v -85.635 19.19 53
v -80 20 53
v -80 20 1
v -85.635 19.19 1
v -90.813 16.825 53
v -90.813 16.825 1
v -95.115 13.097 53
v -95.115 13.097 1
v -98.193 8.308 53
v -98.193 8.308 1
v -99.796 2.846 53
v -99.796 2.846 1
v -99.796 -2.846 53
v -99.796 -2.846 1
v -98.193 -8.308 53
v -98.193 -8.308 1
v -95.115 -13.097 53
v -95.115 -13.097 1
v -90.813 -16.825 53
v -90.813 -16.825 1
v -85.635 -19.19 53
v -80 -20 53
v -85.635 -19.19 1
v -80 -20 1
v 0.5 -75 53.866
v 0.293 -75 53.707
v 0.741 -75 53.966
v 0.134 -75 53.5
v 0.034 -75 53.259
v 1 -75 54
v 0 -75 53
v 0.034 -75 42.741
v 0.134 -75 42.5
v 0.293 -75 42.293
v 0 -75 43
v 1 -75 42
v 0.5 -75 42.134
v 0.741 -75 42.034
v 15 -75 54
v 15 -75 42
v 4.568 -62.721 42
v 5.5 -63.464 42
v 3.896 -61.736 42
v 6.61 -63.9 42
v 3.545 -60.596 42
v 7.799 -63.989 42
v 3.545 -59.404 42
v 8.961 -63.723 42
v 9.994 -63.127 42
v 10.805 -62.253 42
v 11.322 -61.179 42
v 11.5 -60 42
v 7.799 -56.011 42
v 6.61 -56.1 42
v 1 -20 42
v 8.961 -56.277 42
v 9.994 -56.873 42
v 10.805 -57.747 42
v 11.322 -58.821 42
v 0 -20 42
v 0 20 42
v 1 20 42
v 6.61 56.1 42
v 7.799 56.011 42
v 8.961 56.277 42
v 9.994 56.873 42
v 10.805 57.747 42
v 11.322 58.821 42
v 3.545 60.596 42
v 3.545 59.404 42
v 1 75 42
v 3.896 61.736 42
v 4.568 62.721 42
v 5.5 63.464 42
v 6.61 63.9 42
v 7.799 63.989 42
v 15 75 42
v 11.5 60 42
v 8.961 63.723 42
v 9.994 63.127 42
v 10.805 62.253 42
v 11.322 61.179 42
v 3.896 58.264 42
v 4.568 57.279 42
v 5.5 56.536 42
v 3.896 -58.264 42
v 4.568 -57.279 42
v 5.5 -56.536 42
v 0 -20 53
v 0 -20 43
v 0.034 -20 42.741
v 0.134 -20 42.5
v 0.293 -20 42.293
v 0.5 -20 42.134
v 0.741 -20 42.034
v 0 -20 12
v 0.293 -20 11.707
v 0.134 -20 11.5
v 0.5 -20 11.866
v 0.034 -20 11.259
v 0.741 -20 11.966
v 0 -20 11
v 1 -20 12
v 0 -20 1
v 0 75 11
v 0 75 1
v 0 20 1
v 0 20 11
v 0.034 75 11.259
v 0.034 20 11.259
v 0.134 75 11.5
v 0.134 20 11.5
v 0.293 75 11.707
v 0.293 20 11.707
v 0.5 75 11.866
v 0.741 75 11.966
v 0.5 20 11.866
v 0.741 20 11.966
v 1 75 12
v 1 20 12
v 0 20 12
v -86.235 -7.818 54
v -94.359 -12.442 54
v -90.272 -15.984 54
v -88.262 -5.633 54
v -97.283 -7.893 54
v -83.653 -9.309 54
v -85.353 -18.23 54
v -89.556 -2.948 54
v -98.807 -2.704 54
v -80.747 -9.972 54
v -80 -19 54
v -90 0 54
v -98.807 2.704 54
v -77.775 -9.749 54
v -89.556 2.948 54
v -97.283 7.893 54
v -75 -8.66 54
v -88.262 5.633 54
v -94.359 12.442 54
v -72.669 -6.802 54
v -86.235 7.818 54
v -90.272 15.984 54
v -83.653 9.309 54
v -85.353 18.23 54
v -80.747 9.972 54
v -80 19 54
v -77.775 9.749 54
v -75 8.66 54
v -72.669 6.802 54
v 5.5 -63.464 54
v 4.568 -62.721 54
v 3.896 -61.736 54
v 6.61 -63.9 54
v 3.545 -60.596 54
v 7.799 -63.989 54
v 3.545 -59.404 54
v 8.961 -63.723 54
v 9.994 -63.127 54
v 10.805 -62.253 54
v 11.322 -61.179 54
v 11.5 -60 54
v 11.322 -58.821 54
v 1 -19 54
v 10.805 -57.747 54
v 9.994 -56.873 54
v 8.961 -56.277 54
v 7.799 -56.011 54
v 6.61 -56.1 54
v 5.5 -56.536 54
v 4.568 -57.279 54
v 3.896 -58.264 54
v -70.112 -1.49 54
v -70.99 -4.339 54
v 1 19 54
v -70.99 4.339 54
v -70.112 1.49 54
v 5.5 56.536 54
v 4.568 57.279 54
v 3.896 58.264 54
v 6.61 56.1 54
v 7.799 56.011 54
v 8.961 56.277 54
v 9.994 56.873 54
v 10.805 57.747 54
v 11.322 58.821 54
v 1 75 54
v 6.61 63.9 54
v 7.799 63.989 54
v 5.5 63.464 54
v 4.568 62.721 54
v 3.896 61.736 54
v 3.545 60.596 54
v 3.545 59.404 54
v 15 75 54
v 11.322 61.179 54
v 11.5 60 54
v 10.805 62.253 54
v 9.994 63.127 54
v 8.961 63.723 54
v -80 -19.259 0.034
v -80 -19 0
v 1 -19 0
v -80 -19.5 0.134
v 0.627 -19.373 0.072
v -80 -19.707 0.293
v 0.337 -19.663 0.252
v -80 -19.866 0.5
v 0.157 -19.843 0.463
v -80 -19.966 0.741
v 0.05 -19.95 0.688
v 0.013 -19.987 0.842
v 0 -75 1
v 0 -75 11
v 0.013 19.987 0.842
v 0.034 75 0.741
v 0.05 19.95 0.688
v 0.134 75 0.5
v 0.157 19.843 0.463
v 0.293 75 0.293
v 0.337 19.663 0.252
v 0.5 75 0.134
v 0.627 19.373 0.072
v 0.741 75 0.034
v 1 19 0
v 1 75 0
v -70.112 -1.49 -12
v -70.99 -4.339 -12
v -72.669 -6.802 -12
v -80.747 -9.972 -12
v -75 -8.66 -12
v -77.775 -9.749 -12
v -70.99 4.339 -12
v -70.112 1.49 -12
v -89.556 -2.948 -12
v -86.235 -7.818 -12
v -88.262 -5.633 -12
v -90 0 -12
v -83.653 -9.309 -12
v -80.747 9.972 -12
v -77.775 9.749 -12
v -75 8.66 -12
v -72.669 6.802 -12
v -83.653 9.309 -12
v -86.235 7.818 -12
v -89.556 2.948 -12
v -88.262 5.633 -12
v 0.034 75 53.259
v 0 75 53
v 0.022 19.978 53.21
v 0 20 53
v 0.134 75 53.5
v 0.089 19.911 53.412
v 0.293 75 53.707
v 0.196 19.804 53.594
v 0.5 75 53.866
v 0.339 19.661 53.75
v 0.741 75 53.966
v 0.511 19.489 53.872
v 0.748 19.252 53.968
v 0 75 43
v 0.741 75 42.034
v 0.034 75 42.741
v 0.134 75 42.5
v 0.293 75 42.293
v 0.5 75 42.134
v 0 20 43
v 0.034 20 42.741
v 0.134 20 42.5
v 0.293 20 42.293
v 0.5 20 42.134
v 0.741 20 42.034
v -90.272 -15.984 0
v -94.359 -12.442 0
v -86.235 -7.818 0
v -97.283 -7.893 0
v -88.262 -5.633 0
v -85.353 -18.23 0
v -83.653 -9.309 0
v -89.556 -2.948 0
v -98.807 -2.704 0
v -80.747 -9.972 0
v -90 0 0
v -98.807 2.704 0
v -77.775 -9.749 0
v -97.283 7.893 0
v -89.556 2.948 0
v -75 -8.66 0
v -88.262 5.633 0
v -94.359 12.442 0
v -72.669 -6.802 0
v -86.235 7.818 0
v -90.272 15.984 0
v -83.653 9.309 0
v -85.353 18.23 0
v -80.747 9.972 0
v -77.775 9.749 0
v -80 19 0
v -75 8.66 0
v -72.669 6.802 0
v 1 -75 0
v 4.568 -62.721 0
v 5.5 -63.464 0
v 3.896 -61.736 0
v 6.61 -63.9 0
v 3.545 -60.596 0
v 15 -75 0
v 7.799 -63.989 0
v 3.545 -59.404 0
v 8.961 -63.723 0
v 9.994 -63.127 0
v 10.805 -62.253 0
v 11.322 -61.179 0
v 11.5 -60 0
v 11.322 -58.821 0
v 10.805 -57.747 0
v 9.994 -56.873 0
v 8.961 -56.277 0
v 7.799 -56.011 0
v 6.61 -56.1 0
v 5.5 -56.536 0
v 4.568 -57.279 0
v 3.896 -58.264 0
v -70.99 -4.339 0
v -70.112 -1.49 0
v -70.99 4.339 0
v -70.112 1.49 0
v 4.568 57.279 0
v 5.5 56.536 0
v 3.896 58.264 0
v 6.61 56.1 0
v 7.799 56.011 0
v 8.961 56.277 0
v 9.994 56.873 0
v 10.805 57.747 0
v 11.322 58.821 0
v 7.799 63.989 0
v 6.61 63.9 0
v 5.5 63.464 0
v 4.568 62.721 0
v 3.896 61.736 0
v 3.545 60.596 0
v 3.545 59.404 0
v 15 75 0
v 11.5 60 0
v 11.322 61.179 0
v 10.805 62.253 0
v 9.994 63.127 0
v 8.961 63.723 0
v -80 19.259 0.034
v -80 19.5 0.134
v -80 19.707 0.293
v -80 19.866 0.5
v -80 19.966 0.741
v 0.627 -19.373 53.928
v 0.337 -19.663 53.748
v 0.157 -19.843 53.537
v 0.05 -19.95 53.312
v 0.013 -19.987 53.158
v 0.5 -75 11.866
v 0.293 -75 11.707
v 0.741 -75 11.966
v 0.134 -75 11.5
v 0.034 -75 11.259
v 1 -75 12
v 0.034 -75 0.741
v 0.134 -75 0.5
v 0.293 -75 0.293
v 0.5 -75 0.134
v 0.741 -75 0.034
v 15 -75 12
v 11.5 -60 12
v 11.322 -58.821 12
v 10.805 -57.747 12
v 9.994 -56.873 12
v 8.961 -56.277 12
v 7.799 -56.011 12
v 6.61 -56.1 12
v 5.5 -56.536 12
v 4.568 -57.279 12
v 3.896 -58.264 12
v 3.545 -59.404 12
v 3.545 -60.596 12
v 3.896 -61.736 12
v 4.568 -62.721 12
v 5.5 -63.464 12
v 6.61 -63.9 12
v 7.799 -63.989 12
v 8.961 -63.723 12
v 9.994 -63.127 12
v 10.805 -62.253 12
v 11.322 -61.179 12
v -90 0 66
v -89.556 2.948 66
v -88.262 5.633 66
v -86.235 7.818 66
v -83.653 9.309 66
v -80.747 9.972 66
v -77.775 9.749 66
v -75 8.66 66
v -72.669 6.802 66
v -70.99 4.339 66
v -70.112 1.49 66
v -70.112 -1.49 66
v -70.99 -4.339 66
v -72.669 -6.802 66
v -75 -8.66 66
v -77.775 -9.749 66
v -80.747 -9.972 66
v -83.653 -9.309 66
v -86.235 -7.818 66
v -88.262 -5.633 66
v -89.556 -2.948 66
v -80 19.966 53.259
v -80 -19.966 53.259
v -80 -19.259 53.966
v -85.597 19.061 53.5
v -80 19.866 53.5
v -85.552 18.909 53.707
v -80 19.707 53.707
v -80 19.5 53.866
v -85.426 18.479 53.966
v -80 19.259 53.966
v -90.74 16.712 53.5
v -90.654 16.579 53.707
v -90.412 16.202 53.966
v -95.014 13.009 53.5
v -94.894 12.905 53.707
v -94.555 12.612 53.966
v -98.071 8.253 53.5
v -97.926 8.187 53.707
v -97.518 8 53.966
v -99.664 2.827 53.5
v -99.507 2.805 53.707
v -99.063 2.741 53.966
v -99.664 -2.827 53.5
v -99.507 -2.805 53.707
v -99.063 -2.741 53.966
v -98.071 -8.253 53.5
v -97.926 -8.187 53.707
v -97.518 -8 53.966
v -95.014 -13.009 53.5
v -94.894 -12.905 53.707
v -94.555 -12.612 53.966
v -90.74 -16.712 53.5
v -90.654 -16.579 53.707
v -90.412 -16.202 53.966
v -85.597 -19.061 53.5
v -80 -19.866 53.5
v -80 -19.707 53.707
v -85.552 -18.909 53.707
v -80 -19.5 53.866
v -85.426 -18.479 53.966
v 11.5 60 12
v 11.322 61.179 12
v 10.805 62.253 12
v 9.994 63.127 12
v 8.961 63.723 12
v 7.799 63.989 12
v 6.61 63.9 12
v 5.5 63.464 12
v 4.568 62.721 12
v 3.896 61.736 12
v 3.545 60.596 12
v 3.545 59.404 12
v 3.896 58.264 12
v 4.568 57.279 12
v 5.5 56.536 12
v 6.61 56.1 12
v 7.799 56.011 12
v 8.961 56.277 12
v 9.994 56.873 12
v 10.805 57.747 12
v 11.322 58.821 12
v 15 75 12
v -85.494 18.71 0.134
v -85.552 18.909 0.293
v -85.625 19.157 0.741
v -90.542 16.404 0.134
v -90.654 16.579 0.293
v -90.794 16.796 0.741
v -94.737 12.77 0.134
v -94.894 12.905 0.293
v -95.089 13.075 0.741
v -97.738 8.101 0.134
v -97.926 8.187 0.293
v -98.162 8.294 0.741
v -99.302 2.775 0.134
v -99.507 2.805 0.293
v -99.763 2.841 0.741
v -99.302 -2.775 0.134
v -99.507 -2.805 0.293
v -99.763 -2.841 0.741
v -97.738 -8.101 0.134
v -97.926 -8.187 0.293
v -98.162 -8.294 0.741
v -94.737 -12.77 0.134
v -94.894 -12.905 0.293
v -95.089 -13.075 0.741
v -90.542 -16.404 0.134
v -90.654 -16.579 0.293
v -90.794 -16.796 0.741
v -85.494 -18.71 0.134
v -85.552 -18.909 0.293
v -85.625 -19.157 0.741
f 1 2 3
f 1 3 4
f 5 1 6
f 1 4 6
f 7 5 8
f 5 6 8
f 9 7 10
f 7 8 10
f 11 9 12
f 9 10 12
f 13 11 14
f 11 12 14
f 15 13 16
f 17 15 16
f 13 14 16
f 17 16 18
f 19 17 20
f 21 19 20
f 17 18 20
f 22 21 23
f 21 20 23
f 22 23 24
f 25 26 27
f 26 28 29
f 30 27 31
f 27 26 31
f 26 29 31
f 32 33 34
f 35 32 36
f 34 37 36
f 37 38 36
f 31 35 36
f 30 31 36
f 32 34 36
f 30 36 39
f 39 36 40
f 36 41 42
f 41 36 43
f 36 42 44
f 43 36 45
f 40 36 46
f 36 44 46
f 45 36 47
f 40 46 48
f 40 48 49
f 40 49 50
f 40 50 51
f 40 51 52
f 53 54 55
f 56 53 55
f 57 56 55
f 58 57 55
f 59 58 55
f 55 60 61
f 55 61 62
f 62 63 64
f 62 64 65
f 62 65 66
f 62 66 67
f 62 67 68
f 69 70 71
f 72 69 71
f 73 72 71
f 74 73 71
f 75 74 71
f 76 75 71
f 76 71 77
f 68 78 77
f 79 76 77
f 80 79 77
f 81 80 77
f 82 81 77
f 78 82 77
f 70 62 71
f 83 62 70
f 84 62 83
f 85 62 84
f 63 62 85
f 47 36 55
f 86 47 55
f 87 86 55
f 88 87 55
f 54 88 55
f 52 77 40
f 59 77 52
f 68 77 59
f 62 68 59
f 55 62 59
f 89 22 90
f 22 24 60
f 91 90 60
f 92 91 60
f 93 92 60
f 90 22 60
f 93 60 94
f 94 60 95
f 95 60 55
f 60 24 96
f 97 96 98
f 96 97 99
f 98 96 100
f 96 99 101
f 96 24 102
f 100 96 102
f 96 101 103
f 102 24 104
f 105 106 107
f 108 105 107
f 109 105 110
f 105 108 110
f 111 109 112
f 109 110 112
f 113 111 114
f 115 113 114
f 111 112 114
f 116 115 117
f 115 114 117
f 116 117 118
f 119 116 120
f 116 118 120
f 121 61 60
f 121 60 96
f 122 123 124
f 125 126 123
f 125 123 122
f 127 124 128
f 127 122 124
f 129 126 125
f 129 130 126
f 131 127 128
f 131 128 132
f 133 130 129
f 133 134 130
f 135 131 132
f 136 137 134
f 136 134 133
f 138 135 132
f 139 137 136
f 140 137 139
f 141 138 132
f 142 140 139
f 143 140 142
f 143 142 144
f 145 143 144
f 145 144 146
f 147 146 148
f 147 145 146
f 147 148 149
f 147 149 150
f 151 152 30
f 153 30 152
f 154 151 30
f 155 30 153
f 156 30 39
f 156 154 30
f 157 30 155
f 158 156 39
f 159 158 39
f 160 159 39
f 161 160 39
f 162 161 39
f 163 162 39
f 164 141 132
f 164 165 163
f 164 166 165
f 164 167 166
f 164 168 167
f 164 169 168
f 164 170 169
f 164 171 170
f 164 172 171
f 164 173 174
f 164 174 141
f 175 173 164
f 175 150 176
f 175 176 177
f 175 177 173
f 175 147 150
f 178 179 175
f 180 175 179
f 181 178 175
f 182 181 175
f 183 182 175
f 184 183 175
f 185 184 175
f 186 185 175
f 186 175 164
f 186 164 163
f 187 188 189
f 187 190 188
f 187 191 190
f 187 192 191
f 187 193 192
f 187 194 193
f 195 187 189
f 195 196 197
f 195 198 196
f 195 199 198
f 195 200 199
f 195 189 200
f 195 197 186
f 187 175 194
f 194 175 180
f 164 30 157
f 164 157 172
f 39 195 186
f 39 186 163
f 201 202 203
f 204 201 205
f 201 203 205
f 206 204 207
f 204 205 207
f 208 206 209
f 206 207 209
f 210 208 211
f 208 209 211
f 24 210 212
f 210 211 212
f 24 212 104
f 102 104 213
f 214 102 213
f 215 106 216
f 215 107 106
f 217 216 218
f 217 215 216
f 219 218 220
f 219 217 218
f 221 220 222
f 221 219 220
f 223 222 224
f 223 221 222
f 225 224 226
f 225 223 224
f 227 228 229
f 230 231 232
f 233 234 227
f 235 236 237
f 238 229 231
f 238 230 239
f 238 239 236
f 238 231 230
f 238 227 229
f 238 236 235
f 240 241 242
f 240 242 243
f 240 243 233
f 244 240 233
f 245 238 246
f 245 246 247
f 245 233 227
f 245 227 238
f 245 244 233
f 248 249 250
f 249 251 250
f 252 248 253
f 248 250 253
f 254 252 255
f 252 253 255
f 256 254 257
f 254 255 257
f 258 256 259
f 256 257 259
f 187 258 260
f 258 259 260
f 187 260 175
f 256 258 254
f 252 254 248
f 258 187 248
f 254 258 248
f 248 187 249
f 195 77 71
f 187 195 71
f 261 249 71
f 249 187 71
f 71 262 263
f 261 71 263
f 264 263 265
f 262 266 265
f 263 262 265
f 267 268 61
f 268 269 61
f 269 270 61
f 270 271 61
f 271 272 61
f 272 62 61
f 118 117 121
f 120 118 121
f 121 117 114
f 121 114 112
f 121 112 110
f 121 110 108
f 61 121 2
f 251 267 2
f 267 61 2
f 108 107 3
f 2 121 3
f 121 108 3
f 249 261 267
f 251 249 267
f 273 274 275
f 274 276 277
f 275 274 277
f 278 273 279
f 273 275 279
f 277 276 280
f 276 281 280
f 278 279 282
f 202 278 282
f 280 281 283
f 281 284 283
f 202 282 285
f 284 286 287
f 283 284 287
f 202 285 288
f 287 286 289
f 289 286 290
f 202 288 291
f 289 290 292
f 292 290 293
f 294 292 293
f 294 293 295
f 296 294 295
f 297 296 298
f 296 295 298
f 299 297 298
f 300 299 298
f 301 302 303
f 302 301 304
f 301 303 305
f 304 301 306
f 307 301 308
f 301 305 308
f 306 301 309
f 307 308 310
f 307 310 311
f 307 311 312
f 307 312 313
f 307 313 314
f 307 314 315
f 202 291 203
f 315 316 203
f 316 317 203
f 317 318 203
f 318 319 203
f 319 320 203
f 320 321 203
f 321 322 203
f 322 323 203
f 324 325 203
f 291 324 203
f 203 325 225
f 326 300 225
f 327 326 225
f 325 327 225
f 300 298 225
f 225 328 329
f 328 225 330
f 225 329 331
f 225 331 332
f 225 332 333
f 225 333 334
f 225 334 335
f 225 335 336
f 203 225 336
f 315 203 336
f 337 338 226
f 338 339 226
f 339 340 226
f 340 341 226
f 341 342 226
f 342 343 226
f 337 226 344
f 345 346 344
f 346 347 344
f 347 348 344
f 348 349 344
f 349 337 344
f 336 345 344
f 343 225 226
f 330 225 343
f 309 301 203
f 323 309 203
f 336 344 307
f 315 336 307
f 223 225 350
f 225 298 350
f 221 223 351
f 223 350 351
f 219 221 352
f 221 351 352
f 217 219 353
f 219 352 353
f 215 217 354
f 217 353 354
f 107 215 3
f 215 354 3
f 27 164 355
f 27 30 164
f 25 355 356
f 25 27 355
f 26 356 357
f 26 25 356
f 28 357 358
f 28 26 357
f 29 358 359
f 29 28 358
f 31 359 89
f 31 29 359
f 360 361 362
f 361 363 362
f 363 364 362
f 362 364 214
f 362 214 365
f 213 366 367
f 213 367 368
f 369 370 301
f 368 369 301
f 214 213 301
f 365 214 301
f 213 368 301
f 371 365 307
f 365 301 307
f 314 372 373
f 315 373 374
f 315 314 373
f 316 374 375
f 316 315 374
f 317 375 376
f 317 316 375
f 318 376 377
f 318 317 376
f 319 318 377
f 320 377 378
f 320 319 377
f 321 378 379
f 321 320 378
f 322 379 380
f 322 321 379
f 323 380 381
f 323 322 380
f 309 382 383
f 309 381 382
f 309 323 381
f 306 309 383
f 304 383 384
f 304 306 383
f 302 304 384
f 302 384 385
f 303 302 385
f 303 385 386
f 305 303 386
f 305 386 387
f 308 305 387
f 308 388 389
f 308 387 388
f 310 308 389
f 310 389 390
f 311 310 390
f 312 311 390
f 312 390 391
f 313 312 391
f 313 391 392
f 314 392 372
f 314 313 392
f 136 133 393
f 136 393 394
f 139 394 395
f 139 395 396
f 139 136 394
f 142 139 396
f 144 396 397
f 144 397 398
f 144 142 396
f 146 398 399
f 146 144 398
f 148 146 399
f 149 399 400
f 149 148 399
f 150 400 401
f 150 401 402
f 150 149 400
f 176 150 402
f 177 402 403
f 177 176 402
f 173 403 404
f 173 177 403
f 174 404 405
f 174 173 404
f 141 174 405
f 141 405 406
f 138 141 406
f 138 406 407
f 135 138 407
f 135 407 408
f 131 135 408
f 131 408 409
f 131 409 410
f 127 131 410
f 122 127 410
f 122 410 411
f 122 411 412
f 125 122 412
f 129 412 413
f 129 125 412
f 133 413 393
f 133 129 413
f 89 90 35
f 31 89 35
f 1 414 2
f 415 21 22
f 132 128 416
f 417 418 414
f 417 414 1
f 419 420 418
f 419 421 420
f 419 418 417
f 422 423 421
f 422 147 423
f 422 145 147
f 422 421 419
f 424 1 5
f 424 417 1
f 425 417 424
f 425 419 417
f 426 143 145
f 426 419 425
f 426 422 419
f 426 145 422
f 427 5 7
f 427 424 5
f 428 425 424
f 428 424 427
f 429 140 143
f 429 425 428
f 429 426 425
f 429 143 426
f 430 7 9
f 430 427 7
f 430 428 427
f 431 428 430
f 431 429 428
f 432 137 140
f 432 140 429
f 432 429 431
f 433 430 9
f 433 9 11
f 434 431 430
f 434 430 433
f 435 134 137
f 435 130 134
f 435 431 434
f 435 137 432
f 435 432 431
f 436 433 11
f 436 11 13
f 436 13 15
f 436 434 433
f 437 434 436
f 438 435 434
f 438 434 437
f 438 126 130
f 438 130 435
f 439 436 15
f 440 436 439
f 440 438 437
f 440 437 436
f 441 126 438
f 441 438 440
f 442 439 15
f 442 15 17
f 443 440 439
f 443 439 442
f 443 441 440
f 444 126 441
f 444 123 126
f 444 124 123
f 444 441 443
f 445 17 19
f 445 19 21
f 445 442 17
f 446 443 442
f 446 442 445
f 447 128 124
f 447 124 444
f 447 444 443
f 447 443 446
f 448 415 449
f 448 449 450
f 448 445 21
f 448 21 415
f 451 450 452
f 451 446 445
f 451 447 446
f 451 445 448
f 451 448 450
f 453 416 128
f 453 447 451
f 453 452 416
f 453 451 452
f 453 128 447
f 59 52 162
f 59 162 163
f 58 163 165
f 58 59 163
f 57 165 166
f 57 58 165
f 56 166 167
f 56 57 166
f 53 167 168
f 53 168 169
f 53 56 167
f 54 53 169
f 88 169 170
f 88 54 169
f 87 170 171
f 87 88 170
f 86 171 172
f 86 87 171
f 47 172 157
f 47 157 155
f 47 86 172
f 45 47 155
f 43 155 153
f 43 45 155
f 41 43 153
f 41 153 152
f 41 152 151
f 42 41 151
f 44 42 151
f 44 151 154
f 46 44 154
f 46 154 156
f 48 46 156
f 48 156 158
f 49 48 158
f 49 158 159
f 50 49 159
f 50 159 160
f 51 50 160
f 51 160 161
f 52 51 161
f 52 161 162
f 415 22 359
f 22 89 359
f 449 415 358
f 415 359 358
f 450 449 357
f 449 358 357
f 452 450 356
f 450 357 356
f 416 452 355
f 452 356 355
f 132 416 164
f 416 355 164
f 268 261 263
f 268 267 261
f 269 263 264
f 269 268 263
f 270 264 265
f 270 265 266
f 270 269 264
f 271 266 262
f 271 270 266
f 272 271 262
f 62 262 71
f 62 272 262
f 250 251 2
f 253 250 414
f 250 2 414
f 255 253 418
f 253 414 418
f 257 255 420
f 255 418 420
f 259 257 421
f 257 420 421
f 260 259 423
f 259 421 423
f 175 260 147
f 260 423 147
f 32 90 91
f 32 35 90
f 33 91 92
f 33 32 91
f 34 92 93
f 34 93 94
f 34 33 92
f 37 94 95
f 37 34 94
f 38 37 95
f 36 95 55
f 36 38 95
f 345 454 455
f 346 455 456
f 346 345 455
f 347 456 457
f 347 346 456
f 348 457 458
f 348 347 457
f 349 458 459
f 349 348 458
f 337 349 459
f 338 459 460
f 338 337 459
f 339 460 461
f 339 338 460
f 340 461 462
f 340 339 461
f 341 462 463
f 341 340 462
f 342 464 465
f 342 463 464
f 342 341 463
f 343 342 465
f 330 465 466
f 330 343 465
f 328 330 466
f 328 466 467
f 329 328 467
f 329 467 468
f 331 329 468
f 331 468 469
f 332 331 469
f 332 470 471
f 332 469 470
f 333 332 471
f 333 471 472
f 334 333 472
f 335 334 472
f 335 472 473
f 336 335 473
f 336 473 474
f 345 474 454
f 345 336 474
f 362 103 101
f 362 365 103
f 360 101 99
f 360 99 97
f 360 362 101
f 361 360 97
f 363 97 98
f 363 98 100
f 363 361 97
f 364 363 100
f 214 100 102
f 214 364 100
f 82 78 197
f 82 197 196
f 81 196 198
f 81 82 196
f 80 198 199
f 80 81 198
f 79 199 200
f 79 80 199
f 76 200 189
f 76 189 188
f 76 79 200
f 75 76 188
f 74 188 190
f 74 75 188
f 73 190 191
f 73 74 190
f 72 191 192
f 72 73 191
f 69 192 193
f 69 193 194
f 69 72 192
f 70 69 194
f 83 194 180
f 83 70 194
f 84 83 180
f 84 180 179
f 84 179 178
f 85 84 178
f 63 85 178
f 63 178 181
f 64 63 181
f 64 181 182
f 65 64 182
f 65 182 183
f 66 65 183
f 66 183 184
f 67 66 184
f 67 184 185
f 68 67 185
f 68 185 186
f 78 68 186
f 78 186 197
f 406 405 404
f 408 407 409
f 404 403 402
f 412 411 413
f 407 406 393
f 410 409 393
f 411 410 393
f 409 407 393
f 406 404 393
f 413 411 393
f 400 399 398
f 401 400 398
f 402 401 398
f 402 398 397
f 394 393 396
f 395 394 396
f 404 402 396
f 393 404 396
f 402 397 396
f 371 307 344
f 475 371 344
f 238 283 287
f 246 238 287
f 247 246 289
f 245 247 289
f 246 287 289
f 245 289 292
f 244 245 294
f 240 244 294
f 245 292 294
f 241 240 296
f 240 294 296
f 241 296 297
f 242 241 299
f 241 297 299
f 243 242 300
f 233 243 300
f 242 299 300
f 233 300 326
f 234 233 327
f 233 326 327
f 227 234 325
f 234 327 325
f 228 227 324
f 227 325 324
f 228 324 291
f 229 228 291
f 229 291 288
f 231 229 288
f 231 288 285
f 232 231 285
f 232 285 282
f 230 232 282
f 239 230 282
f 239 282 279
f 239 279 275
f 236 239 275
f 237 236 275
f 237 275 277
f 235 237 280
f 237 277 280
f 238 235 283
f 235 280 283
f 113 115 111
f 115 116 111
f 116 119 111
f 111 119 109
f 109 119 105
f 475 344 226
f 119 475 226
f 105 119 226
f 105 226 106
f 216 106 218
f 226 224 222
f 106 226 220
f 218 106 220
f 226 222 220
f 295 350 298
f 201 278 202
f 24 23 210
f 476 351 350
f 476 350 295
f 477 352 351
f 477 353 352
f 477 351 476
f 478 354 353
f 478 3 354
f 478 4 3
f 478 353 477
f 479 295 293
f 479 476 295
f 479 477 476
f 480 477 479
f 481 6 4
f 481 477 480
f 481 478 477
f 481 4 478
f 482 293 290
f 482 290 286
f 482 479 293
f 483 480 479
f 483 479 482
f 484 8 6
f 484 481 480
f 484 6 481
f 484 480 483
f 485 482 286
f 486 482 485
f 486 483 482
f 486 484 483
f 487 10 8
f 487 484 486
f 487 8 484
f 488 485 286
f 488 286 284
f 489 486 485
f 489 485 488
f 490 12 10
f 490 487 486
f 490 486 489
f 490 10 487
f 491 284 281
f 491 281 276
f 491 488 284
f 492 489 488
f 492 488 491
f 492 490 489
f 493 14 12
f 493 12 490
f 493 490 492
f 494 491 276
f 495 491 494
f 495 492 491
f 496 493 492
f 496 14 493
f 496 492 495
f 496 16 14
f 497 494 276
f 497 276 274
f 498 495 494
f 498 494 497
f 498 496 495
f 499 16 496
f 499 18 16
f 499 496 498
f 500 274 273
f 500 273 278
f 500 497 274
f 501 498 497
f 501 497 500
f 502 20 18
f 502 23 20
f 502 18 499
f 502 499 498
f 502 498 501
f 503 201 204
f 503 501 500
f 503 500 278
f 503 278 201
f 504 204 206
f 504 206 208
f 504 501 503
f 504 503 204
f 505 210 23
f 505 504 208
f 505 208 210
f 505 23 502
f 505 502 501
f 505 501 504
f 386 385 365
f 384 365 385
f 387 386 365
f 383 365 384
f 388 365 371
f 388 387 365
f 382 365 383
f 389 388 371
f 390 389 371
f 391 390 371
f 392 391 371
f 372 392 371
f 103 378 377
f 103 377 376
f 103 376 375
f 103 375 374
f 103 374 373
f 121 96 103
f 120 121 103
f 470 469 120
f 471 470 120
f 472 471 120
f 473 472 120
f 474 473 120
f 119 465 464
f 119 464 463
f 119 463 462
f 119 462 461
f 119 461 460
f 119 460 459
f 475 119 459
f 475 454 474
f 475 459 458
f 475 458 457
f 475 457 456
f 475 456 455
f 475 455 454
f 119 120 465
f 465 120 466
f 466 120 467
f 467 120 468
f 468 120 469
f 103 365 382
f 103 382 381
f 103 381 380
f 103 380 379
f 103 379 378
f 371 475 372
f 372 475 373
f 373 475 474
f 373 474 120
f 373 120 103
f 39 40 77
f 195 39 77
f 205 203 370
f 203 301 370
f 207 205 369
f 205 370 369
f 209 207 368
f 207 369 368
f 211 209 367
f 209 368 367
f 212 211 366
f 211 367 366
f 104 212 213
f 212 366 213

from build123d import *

# Parameters (mm, degrees)
SKETCH1_R           = 4
BOSS_EXTRUDE1_DEPTH = 54
SKETCH2_R           = 10
BOSS_EXTRUDE2_DEPTH = 12
SKETCH3_W           = 15
SKETCH3_H           = 30
CUT_EXTRUDE1_DEPTH  = 150
FILLET1_R           = 1


with BuildPart() as part:
    # Sketch1 → Boss-Extrude1 (new body)
    with BuildSketch(Plane.XY):
        with BuildLine():
            Line((0, 75), (0, 20))
            Line((0, 20), (-80, 20))
            ThreePointArc((-80, 20), (-100, 0), (-80, -20))
            Line((-80, -20), (0, -20))
            Line((0, -20), (0, -75))
            Line((0, -75), (15, -75))
            Line((15, -75), (15, 75))
            Line((15, 75), (0, 75))
        make_face()
        with Locations((7.5, 60)):
            Circle(SKETCH1_R, mode=Mode.SUBTRACT)
        with Locations((7.5, -60)):
            Circle(SKETCH1_R, mode=Mode.SUBTRACT)
    extrude(amount=BOSS_EXTRUDE1_DEPTH)

    # Sketch2 → Boss-Extrude2 (add)
    with BuildSketch(Plane(origin=(0, 0, 0), x_dir=(-1, 0, 0), z_dir=(0, 0, -1))):
        with Locations((80, 0)):
            Circle(SKETCH2_R)
    boss_extrude2 = extrude(amount=BOSS_EXTRUDE2_DEPTH)

    # Mirror1: Boss-Extrude2 across plane
    add(boss_extrude2.mirror(Plane.XY.offset(27)))

    # Sketch3 → Cut-Extrude1 (cut)
    with BuildSketch(Plane(origin=(0, 75, 0), x_dir=(1, 0, 0), z_dir=(0, 1, 0))):
        with Locations((7.5, -27)):
            Rectangle(SKETCH3_W, SKETCH3_H)
    extrude(amount=-CUT_EXTRUDE1_DEPTH, mode=Mode.SUBTRACT)

    # Fillet1
    fillet1_edges = [part.edges().sort_by_distance(p)[0] for p in [
        (0, -47.5, 0),
        (-40, -20, 0),
        (-100, 0, 0),
        (0, -47.5, 54),
        (0, 47.5, 54),
        (-40, 20, 54),
        (-100, 0, 54),
        (0, -47.5, 42),
        (0, 47.5, 42),
        (0, -47.5, 12),
        (0, 47.5, 12),
        (-40, 20, 0),
        (-40, -20, 54),
        (0, 47.5, 0),
    ]]
    fillet(fillet1_edges, radius=FILLET1_R)


solid = part.part
